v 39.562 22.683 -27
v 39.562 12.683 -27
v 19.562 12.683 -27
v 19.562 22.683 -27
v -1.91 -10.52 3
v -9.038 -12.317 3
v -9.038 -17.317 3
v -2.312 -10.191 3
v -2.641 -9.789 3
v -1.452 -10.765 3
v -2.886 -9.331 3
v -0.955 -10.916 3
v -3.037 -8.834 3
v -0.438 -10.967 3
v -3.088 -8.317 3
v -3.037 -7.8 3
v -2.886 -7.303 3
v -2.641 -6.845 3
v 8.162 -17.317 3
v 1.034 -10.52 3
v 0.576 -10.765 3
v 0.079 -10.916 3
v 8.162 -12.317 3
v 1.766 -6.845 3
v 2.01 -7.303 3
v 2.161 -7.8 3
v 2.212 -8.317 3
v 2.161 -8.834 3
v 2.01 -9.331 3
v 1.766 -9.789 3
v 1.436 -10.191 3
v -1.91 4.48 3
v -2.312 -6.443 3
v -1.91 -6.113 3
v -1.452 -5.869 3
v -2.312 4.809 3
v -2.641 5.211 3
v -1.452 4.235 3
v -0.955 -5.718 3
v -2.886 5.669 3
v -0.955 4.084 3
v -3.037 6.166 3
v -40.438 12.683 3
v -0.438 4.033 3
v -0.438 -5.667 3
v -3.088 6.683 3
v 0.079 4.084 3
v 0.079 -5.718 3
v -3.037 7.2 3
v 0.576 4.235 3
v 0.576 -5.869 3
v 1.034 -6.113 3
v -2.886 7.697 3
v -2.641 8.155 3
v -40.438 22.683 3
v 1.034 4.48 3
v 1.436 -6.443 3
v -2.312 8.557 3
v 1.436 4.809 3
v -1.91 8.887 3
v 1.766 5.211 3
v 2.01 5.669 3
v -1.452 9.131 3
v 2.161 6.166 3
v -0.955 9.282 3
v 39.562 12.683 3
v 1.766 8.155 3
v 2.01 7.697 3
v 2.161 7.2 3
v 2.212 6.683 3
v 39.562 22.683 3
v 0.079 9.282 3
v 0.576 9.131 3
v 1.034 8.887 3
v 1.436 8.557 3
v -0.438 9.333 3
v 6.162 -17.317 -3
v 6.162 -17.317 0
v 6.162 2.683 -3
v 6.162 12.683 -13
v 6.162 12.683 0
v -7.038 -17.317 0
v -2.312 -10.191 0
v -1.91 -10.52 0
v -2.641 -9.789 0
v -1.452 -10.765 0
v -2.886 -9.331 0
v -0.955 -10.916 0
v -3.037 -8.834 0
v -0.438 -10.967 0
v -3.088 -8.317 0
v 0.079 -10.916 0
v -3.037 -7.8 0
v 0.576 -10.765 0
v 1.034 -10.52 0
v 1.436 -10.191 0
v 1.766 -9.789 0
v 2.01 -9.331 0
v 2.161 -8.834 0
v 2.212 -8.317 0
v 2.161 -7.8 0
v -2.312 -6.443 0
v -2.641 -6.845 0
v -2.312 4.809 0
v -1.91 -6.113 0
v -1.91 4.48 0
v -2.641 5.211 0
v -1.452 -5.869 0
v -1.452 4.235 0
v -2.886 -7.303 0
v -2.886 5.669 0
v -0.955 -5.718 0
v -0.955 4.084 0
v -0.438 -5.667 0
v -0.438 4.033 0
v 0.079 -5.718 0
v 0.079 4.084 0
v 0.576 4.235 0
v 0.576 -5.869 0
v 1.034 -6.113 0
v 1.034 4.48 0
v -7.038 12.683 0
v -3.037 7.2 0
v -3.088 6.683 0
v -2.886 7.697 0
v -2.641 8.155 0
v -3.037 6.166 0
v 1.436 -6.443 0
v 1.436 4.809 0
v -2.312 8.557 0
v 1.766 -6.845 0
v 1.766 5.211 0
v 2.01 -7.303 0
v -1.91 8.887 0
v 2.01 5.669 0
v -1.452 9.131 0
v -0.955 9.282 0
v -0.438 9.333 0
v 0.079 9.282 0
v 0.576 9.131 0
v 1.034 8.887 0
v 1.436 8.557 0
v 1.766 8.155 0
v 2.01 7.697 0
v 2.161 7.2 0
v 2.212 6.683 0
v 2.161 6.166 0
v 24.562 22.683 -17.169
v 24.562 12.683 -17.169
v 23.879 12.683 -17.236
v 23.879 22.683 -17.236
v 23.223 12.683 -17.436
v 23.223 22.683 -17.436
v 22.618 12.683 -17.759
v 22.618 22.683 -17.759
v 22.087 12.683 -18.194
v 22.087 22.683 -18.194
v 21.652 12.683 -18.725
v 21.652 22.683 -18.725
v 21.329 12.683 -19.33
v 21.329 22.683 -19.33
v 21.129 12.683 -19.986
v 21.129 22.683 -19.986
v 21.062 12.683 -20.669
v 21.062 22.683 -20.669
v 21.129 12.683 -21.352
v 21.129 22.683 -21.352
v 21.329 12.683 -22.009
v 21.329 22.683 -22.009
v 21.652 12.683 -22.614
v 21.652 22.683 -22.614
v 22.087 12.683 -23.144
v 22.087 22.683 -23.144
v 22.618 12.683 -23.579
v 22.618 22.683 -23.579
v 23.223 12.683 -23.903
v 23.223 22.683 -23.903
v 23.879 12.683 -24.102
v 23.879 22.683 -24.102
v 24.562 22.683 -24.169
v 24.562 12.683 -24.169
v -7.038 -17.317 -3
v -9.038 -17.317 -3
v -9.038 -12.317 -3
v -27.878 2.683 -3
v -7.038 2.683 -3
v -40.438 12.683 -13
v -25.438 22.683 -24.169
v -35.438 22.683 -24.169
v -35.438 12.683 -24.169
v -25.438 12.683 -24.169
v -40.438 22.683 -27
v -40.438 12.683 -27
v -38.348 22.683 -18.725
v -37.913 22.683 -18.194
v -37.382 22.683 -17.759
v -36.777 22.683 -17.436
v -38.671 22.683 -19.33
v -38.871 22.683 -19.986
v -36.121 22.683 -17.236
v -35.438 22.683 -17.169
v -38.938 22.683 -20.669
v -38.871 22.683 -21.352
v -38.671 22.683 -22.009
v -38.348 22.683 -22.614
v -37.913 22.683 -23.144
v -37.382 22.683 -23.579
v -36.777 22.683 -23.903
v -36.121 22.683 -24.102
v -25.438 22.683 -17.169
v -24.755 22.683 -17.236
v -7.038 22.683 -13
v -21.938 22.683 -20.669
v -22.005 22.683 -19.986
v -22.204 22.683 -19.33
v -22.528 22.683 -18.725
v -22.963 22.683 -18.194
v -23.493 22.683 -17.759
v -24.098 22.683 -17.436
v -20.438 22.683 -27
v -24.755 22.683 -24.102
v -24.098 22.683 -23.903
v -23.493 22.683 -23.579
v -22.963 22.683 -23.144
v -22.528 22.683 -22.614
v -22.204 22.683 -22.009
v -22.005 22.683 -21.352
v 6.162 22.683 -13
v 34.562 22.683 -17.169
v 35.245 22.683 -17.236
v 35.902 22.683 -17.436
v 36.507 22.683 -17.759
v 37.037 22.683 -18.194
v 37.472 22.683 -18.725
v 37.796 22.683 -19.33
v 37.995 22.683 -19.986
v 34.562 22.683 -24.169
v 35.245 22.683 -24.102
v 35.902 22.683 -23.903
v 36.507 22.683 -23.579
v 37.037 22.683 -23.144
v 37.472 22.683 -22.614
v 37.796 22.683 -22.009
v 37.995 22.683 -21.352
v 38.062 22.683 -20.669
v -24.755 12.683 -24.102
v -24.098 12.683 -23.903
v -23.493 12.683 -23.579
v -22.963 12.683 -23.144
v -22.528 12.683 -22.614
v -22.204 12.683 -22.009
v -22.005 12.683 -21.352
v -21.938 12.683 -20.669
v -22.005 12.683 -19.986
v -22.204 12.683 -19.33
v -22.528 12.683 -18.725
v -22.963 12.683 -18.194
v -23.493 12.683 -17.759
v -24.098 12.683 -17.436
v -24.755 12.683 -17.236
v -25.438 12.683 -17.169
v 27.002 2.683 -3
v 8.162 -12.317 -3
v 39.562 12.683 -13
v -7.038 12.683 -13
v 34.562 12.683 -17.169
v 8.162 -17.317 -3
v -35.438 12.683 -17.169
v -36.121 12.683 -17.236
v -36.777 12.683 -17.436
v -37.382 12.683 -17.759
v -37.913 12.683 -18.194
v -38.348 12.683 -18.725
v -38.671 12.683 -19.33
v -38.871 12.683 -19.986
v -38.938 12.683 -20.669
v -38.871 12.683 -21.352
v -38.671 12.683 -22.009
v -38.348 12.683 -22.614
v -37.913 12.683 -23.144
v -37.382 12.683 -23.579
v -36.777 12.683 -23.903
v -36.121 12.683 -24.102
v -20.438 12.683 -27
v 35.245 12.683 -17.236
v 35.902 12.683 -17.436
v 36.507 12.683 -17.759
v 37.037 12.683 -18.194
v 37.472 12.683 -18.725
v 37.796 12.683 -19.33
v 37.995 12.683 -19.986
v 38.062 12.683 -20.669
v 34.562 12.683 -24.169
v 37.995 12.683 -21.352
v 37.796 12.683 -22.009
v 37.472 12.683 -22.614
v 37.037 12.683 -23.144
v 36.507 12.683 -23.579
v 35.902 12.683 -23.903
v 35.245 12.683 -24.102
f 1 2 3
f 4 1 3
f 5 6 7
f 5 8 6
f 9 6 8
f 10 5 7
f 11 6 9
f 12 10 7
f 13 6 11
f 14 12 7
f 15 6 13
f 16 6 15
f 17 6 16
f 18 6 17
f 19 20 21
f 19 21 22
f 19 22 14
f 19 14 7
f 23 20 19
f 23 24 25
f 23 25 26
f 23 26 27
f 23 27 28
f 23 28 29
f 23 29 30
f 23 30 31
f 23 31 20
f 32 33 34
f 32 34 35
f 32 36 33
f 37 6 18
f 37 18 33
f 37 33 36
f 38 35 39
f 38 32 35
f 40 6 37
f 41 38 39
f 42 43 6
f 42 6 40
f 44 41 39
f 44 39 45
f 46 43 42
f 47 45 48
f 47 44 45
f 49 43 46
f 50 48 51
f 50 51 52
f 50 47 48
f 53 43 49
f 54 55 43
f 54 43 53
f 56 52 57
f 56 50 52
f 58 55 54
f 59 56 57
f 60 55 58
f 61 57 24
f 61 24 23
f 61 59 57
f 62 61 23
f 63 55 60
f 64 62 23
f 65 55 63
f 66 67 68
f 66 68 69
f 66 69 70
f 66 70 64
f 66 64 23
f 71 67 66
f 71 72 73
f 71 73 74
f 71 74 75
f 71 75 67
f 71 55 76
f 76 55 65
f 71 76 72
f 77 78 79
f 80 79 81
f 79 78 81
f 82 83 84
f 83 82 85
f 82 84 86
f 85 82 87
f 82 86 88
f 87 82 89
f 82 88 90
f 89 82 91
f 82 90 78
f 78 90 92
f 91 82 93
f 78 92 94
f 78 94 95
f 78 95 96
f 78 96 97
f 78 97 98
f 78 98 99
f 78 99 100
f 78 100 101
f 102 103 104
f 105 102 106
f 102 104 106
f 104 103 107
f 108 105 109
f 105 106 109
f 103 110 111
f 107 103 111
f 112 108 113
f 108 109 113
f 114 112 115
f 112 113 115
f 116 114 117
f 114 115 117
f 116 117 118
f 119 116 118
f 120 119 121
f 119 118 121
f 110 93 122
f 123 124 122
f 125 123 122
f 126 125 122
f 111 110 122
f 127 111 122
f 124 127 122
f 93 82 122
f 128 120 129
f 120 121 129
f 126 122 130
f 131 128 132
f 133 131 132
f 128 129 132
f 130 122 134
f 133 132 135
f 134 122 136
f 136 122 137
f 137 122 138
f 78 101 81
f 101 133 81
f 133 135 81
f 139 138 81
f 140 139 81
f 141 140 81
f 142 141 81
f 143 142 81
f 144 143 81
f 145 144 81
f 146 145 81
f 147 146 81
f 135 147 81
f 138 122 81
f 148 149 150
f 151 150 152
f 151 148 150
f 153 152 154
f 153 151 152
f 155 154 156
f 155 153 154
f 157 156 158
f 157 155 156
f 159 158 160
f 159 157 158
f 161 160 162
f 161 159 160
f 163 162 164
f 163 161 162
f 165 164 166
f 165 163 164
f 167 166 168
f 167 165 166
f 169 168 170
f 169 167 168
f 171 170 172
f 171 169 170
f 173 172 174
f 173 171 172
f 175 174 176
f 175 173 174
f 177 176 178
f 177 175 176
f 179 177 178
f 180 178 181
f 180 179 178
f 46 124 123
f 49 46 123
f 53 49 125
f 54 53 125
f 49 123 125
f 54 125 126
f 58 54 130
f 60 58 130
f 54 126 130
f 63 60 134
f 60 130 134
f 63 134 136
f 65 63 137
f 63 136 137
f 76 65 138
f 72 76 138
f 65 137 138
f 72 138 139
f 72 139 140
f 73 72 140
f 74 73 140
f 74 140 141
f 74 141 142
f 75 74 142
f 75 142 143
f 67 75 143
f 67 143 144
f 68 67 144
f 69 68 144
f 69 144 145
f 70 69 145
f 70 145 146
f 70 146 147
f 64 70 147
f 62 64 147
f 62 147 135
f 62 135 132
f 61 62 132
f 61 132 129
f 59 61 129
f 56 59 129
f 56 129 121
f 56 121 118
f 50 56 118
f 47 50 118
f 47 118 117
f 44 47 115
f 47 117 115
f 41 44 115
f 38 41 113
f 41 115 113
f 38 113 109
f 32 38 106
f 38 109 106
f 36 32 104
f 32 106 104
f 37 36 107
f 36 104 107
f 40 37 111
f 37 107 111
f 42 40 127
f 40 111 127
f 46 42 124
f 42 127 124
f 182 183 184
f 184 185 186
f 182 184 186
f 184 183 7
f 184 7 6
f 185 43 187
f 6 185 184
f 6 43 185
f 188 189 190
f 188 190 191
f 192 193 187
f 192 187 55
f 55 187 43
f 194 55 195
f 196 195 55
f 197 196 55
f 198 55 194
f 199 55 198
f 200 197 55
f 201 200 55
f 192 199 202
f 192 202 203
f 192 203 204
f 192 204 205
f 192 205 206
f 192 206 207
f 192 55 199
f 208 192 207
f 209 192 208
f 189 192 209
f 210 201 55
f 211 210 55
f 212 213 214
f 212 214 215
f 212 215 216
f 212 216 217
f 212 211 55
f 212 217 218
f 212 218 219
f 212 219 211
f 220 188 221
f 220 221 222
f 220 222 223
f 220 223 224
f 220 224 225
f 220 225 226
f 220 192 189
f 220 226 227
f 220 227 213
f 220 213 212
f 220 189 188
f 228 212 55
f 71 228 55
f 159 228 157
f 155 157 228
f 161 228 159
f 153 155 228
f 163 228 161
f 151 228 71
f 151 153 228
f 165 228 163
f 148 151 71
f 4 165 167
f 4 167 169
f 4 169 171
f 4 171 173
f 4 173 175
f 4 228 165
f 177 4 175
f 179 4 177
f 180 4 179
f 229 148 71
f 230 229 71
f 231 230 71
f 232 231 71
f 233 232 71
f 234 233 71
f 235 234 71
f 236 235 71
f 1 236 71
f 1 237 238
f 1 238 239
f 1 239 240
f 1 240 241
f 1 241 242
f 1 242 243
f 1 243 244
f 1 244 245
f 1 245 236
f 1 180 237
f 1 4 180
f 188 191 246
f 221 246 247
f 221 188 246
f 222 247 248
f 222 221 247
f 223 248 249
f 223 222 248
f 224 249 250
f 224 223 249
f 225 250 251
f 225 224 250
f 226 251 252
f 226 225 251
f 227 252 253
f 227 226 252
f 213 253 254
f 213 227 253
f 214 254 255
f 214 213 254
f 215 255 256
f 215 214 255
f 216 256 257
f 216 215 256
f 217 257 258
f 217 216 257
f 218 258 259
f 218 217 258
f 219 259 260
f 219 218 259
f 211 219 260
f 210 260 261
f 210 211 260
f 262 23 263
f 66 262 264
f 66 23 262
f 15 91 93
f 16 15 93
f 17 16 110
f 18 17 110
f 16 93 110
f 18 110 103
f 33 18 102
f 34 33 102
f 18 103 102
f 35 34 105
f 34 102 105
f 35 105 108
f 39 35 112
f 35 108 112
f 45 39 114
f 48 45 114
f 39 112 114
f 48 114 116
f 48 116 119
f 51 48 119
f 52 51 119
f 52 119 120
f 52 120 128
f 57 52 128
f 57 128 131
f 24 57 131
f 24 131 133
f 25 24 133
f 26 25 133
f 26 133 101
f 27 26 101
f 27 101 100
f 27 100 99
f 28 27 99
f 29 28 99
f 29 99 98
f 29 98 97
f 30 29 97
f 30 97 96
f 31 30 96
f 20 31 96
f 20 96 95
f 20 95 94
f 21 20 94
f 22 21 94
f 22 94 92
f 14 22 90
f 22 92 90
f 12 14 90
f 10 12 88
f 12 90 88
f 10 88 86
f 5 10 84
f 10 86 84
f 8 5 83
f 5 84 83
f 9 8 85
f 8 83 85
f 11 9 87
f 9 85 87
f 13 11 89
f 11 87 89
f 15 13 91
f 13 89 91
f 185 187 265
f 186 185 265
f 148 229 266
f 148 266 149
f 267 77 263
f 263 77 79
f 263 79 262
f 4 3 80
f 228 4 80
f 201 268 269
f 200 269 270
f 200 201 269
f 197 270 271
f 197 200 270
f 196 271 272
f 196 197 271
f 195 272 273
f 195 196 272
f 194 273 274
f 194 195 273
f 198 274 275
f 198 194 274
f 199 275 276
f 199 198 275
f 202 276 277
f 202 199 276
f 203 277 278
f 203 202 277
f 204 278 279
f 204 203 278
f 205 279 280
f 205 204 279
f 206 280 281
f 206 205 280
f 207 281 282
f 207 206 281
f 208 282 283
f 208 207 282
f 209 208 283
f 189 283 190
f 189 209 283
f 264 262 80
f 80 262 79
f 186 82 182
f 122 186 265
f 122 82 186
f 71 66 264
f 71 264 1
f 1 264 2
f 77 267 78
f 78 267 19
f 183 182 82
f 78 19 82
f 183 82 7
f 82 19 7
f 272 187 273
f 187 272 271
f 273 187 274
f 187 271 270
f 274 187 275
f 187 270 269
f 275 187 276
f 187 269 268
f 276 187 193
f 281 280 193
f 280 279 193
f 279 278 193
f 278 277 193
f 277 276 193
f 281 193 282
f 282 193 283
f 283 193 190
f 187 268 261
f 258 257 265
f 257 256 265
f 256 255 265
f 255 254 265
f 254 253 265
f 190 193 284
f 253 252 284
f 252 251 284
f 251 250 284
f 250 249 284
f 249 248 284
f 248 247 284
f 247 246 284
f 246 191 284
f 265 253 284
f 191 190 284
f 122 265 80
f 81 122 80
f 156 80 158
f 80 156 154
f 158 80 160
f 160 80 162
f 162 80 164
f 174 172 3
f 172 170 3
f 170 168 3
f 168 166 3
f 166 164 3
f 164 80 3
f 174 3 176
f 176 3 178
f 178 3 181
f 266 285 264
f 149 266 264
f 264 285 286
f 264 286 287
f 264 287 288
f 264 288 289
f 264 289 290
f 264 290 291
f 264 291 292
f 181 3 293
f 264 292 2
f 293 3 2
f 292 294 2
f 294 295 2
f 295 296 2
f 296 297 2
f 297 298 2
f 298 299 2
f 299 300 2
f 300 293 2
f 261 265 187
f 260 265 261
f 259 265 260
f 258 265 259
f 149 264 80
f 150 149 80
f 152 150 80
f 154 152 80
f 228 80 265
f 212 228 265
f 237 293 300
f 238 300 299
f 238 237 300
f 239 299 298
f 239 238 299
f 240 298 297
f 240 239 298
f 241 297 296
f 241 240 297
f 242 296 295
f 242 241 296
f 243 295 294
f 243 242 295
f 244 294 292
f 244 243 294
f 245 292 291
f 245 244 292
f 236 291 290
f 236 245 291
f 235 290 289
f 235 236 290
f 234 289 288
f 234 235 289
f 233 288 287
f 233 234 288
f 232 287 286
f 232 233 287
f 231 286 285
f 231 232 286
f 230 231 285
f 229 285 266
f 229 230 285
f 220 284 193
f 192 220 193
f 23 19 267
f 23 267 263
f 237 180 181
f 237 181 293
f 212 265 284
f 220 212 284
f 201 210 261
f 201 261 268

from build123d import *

# Parameters (mm, degrees)
ESQUISSE1_W             = 13.2
ESQUISSE1_H             = 30
ESQUISSE1_W_2           = 2
BOSS_EXTRU_1_DEPTH      = 3
ESQUISSE2_W             = 2
ESQUISSE2_H             = 30
BOSS_EXTRU_2_DEPTH      = 3
BOSS_EXTRU_3_DEPTH      = 10
BOSS_EXTRU_4_DEPTH      = 6
ESQUISSE6_R             = 2.65
ENL_V_MAT_EXTRU_1_DEPTH = 4
ENL_V_MAT_EXTRU_2_DEPTH = 41
CHANFREIN2_SIZE         = 10


with BuildPart() as part:
    # Esquisse1 → Boss.-Extru.1 (new body)
    with BuildSketch(Plane.XY):
        with Locations((-0.437888948, -2.316831683)):
            Rectangle(ESQUISSE1_W, ESQUISSE1_H)
        with Locations((-8.037888948, -2.316831683)):
            Rectangle(ESQUISSE1_W_2, ESQUISSE1_H)
        with Locations((7.162111052, -2.316831683)):
            Rectangle(ESQUISSE1_W_2, ESQUISSE1_H)
    extrude(amount=BOSS_EXTRU_1_DEPTH)

    # Esquisse2 → Boss.-Extru.2 (add)
    with BuildSketch(Plane(origin=(0, 0, 0), x_dir=(-1, 0, 0), z_dir=(0, 0, -1))):
        with Locations((-7.162111052, -2.316831683)):
            Rectangle(ESQUISSE2_W, ESQUISSE2_H)
        with Locations((8.037888948, -2.316831683)):
            Rectangle(ESQUISSE2_W, ESQUISSE2_H)
    extrude(amount=BOSS_EXTRU_2_DEPTH)

    # Esquisse3 → Boss.-Extru.3 (add)
    with BuildSketch(Plane(origin=(0, 12.683168317, 0), x_dir=(1, 0, 0), z_dir=(0, 1, 0))):
        Polygon((19.562111052, 27), (6.162111052, 13), (-7.037888948, 13), (-20.437888948, 27), (-40.437888948, 27), (-40.437888948, -3), (39.562111052, -3), (39.562111052, 27), align=None)
    extrude(amount=BOSS_EXTRU_3_DEPTH)

    # Esquisse5 → Boss.-Extru.4 (add)
    with BuildSketch(Plane.XY.offset(3)):
        Polygon((-9.037888948, 12.683168317), (-40.437888948, 12.683168317), (-9.037888948, -12.316831683), align=None)
        Polygon((8.162111052, -12.316831683), (39.562111052, 12.683168317), (8.162111052, 12.683168317), align=None)
    extrude(amount=-BOSS_EXTRU_4_DEPTH)

    # Esquisse6 → Enlèv. mat.-Extru.1 (cut, through all)
    with BuildSketch(Plane(origin=(0, 0, 0), x_dir=(-1, 0, 0), z_dir=(0, 0, -1))):
        with Locations((0.437888948, 6.683168317)):
            Circle(ESQUISSE6_R)
        with Locations((0.437888948, -8.316831683)):
            Circle(ESQUISSE6_R)
    extrude(amount=-ENL_V_MAT_EXTRU_1_DEPTH, mode=Mode.SUBTRACT)

    # Esquisse7 → Enlèv. mat.-Extru.2 (cut, through all)
    with BuildSketch(Plane(origin=(0, 22.683168317, 0), x_dir=(1, 0, 0), z_dir=(0, 1, 0))):
        with BuildLine():
            Line((-25.437888948, 17.169217815), (-35.437888948, 17.169217815))
            ThreePointArc((-35.437888948, 17.169217815), (-38.937888948, 20.669217815), (-35.437888948, 24.169217815))
            Line((-35.437888948, 24.169217815), (-25.437888948, 24.169217815))
            ThreePointArc((-25.437888948, 24.169217815), (-21.937888948, 20.669217815), (-25.437888948, 17.169217815))
        make_face()
        with BuildLine():
            Line((34.562111052, 17.169217815), (24.562111052, 17.169217815))
            ThreePointArc((24.562111052, 17.169217815), (21.062111052, 20.669217815), (24.562111052, 24.169217815))
            Line((24.562111052, 24.169217815), (34.562111052, 24.169217815))
            ThreePointArc((34.562111052, 24.169217815), (38.062111052, 20.669217815), (34.562111052, 17.169217815))
        make_face()
    extrude(amount=-ENL_V_MAT_EXTRU_2_DEPTH, mode=Mode.SUBTRACT)

    # Chanfrein2
    chanfrein2_edges = [part.edges().sort_by_distance(p)[0] for p in [
        (22.862111052, 12.683168317, -3),
        (-23.737888948, 12.683168317, -3),
    ]]
    chamfer(chanfrein2_edges, length=CHANFREIN2_SIZE)


solid = part.part
